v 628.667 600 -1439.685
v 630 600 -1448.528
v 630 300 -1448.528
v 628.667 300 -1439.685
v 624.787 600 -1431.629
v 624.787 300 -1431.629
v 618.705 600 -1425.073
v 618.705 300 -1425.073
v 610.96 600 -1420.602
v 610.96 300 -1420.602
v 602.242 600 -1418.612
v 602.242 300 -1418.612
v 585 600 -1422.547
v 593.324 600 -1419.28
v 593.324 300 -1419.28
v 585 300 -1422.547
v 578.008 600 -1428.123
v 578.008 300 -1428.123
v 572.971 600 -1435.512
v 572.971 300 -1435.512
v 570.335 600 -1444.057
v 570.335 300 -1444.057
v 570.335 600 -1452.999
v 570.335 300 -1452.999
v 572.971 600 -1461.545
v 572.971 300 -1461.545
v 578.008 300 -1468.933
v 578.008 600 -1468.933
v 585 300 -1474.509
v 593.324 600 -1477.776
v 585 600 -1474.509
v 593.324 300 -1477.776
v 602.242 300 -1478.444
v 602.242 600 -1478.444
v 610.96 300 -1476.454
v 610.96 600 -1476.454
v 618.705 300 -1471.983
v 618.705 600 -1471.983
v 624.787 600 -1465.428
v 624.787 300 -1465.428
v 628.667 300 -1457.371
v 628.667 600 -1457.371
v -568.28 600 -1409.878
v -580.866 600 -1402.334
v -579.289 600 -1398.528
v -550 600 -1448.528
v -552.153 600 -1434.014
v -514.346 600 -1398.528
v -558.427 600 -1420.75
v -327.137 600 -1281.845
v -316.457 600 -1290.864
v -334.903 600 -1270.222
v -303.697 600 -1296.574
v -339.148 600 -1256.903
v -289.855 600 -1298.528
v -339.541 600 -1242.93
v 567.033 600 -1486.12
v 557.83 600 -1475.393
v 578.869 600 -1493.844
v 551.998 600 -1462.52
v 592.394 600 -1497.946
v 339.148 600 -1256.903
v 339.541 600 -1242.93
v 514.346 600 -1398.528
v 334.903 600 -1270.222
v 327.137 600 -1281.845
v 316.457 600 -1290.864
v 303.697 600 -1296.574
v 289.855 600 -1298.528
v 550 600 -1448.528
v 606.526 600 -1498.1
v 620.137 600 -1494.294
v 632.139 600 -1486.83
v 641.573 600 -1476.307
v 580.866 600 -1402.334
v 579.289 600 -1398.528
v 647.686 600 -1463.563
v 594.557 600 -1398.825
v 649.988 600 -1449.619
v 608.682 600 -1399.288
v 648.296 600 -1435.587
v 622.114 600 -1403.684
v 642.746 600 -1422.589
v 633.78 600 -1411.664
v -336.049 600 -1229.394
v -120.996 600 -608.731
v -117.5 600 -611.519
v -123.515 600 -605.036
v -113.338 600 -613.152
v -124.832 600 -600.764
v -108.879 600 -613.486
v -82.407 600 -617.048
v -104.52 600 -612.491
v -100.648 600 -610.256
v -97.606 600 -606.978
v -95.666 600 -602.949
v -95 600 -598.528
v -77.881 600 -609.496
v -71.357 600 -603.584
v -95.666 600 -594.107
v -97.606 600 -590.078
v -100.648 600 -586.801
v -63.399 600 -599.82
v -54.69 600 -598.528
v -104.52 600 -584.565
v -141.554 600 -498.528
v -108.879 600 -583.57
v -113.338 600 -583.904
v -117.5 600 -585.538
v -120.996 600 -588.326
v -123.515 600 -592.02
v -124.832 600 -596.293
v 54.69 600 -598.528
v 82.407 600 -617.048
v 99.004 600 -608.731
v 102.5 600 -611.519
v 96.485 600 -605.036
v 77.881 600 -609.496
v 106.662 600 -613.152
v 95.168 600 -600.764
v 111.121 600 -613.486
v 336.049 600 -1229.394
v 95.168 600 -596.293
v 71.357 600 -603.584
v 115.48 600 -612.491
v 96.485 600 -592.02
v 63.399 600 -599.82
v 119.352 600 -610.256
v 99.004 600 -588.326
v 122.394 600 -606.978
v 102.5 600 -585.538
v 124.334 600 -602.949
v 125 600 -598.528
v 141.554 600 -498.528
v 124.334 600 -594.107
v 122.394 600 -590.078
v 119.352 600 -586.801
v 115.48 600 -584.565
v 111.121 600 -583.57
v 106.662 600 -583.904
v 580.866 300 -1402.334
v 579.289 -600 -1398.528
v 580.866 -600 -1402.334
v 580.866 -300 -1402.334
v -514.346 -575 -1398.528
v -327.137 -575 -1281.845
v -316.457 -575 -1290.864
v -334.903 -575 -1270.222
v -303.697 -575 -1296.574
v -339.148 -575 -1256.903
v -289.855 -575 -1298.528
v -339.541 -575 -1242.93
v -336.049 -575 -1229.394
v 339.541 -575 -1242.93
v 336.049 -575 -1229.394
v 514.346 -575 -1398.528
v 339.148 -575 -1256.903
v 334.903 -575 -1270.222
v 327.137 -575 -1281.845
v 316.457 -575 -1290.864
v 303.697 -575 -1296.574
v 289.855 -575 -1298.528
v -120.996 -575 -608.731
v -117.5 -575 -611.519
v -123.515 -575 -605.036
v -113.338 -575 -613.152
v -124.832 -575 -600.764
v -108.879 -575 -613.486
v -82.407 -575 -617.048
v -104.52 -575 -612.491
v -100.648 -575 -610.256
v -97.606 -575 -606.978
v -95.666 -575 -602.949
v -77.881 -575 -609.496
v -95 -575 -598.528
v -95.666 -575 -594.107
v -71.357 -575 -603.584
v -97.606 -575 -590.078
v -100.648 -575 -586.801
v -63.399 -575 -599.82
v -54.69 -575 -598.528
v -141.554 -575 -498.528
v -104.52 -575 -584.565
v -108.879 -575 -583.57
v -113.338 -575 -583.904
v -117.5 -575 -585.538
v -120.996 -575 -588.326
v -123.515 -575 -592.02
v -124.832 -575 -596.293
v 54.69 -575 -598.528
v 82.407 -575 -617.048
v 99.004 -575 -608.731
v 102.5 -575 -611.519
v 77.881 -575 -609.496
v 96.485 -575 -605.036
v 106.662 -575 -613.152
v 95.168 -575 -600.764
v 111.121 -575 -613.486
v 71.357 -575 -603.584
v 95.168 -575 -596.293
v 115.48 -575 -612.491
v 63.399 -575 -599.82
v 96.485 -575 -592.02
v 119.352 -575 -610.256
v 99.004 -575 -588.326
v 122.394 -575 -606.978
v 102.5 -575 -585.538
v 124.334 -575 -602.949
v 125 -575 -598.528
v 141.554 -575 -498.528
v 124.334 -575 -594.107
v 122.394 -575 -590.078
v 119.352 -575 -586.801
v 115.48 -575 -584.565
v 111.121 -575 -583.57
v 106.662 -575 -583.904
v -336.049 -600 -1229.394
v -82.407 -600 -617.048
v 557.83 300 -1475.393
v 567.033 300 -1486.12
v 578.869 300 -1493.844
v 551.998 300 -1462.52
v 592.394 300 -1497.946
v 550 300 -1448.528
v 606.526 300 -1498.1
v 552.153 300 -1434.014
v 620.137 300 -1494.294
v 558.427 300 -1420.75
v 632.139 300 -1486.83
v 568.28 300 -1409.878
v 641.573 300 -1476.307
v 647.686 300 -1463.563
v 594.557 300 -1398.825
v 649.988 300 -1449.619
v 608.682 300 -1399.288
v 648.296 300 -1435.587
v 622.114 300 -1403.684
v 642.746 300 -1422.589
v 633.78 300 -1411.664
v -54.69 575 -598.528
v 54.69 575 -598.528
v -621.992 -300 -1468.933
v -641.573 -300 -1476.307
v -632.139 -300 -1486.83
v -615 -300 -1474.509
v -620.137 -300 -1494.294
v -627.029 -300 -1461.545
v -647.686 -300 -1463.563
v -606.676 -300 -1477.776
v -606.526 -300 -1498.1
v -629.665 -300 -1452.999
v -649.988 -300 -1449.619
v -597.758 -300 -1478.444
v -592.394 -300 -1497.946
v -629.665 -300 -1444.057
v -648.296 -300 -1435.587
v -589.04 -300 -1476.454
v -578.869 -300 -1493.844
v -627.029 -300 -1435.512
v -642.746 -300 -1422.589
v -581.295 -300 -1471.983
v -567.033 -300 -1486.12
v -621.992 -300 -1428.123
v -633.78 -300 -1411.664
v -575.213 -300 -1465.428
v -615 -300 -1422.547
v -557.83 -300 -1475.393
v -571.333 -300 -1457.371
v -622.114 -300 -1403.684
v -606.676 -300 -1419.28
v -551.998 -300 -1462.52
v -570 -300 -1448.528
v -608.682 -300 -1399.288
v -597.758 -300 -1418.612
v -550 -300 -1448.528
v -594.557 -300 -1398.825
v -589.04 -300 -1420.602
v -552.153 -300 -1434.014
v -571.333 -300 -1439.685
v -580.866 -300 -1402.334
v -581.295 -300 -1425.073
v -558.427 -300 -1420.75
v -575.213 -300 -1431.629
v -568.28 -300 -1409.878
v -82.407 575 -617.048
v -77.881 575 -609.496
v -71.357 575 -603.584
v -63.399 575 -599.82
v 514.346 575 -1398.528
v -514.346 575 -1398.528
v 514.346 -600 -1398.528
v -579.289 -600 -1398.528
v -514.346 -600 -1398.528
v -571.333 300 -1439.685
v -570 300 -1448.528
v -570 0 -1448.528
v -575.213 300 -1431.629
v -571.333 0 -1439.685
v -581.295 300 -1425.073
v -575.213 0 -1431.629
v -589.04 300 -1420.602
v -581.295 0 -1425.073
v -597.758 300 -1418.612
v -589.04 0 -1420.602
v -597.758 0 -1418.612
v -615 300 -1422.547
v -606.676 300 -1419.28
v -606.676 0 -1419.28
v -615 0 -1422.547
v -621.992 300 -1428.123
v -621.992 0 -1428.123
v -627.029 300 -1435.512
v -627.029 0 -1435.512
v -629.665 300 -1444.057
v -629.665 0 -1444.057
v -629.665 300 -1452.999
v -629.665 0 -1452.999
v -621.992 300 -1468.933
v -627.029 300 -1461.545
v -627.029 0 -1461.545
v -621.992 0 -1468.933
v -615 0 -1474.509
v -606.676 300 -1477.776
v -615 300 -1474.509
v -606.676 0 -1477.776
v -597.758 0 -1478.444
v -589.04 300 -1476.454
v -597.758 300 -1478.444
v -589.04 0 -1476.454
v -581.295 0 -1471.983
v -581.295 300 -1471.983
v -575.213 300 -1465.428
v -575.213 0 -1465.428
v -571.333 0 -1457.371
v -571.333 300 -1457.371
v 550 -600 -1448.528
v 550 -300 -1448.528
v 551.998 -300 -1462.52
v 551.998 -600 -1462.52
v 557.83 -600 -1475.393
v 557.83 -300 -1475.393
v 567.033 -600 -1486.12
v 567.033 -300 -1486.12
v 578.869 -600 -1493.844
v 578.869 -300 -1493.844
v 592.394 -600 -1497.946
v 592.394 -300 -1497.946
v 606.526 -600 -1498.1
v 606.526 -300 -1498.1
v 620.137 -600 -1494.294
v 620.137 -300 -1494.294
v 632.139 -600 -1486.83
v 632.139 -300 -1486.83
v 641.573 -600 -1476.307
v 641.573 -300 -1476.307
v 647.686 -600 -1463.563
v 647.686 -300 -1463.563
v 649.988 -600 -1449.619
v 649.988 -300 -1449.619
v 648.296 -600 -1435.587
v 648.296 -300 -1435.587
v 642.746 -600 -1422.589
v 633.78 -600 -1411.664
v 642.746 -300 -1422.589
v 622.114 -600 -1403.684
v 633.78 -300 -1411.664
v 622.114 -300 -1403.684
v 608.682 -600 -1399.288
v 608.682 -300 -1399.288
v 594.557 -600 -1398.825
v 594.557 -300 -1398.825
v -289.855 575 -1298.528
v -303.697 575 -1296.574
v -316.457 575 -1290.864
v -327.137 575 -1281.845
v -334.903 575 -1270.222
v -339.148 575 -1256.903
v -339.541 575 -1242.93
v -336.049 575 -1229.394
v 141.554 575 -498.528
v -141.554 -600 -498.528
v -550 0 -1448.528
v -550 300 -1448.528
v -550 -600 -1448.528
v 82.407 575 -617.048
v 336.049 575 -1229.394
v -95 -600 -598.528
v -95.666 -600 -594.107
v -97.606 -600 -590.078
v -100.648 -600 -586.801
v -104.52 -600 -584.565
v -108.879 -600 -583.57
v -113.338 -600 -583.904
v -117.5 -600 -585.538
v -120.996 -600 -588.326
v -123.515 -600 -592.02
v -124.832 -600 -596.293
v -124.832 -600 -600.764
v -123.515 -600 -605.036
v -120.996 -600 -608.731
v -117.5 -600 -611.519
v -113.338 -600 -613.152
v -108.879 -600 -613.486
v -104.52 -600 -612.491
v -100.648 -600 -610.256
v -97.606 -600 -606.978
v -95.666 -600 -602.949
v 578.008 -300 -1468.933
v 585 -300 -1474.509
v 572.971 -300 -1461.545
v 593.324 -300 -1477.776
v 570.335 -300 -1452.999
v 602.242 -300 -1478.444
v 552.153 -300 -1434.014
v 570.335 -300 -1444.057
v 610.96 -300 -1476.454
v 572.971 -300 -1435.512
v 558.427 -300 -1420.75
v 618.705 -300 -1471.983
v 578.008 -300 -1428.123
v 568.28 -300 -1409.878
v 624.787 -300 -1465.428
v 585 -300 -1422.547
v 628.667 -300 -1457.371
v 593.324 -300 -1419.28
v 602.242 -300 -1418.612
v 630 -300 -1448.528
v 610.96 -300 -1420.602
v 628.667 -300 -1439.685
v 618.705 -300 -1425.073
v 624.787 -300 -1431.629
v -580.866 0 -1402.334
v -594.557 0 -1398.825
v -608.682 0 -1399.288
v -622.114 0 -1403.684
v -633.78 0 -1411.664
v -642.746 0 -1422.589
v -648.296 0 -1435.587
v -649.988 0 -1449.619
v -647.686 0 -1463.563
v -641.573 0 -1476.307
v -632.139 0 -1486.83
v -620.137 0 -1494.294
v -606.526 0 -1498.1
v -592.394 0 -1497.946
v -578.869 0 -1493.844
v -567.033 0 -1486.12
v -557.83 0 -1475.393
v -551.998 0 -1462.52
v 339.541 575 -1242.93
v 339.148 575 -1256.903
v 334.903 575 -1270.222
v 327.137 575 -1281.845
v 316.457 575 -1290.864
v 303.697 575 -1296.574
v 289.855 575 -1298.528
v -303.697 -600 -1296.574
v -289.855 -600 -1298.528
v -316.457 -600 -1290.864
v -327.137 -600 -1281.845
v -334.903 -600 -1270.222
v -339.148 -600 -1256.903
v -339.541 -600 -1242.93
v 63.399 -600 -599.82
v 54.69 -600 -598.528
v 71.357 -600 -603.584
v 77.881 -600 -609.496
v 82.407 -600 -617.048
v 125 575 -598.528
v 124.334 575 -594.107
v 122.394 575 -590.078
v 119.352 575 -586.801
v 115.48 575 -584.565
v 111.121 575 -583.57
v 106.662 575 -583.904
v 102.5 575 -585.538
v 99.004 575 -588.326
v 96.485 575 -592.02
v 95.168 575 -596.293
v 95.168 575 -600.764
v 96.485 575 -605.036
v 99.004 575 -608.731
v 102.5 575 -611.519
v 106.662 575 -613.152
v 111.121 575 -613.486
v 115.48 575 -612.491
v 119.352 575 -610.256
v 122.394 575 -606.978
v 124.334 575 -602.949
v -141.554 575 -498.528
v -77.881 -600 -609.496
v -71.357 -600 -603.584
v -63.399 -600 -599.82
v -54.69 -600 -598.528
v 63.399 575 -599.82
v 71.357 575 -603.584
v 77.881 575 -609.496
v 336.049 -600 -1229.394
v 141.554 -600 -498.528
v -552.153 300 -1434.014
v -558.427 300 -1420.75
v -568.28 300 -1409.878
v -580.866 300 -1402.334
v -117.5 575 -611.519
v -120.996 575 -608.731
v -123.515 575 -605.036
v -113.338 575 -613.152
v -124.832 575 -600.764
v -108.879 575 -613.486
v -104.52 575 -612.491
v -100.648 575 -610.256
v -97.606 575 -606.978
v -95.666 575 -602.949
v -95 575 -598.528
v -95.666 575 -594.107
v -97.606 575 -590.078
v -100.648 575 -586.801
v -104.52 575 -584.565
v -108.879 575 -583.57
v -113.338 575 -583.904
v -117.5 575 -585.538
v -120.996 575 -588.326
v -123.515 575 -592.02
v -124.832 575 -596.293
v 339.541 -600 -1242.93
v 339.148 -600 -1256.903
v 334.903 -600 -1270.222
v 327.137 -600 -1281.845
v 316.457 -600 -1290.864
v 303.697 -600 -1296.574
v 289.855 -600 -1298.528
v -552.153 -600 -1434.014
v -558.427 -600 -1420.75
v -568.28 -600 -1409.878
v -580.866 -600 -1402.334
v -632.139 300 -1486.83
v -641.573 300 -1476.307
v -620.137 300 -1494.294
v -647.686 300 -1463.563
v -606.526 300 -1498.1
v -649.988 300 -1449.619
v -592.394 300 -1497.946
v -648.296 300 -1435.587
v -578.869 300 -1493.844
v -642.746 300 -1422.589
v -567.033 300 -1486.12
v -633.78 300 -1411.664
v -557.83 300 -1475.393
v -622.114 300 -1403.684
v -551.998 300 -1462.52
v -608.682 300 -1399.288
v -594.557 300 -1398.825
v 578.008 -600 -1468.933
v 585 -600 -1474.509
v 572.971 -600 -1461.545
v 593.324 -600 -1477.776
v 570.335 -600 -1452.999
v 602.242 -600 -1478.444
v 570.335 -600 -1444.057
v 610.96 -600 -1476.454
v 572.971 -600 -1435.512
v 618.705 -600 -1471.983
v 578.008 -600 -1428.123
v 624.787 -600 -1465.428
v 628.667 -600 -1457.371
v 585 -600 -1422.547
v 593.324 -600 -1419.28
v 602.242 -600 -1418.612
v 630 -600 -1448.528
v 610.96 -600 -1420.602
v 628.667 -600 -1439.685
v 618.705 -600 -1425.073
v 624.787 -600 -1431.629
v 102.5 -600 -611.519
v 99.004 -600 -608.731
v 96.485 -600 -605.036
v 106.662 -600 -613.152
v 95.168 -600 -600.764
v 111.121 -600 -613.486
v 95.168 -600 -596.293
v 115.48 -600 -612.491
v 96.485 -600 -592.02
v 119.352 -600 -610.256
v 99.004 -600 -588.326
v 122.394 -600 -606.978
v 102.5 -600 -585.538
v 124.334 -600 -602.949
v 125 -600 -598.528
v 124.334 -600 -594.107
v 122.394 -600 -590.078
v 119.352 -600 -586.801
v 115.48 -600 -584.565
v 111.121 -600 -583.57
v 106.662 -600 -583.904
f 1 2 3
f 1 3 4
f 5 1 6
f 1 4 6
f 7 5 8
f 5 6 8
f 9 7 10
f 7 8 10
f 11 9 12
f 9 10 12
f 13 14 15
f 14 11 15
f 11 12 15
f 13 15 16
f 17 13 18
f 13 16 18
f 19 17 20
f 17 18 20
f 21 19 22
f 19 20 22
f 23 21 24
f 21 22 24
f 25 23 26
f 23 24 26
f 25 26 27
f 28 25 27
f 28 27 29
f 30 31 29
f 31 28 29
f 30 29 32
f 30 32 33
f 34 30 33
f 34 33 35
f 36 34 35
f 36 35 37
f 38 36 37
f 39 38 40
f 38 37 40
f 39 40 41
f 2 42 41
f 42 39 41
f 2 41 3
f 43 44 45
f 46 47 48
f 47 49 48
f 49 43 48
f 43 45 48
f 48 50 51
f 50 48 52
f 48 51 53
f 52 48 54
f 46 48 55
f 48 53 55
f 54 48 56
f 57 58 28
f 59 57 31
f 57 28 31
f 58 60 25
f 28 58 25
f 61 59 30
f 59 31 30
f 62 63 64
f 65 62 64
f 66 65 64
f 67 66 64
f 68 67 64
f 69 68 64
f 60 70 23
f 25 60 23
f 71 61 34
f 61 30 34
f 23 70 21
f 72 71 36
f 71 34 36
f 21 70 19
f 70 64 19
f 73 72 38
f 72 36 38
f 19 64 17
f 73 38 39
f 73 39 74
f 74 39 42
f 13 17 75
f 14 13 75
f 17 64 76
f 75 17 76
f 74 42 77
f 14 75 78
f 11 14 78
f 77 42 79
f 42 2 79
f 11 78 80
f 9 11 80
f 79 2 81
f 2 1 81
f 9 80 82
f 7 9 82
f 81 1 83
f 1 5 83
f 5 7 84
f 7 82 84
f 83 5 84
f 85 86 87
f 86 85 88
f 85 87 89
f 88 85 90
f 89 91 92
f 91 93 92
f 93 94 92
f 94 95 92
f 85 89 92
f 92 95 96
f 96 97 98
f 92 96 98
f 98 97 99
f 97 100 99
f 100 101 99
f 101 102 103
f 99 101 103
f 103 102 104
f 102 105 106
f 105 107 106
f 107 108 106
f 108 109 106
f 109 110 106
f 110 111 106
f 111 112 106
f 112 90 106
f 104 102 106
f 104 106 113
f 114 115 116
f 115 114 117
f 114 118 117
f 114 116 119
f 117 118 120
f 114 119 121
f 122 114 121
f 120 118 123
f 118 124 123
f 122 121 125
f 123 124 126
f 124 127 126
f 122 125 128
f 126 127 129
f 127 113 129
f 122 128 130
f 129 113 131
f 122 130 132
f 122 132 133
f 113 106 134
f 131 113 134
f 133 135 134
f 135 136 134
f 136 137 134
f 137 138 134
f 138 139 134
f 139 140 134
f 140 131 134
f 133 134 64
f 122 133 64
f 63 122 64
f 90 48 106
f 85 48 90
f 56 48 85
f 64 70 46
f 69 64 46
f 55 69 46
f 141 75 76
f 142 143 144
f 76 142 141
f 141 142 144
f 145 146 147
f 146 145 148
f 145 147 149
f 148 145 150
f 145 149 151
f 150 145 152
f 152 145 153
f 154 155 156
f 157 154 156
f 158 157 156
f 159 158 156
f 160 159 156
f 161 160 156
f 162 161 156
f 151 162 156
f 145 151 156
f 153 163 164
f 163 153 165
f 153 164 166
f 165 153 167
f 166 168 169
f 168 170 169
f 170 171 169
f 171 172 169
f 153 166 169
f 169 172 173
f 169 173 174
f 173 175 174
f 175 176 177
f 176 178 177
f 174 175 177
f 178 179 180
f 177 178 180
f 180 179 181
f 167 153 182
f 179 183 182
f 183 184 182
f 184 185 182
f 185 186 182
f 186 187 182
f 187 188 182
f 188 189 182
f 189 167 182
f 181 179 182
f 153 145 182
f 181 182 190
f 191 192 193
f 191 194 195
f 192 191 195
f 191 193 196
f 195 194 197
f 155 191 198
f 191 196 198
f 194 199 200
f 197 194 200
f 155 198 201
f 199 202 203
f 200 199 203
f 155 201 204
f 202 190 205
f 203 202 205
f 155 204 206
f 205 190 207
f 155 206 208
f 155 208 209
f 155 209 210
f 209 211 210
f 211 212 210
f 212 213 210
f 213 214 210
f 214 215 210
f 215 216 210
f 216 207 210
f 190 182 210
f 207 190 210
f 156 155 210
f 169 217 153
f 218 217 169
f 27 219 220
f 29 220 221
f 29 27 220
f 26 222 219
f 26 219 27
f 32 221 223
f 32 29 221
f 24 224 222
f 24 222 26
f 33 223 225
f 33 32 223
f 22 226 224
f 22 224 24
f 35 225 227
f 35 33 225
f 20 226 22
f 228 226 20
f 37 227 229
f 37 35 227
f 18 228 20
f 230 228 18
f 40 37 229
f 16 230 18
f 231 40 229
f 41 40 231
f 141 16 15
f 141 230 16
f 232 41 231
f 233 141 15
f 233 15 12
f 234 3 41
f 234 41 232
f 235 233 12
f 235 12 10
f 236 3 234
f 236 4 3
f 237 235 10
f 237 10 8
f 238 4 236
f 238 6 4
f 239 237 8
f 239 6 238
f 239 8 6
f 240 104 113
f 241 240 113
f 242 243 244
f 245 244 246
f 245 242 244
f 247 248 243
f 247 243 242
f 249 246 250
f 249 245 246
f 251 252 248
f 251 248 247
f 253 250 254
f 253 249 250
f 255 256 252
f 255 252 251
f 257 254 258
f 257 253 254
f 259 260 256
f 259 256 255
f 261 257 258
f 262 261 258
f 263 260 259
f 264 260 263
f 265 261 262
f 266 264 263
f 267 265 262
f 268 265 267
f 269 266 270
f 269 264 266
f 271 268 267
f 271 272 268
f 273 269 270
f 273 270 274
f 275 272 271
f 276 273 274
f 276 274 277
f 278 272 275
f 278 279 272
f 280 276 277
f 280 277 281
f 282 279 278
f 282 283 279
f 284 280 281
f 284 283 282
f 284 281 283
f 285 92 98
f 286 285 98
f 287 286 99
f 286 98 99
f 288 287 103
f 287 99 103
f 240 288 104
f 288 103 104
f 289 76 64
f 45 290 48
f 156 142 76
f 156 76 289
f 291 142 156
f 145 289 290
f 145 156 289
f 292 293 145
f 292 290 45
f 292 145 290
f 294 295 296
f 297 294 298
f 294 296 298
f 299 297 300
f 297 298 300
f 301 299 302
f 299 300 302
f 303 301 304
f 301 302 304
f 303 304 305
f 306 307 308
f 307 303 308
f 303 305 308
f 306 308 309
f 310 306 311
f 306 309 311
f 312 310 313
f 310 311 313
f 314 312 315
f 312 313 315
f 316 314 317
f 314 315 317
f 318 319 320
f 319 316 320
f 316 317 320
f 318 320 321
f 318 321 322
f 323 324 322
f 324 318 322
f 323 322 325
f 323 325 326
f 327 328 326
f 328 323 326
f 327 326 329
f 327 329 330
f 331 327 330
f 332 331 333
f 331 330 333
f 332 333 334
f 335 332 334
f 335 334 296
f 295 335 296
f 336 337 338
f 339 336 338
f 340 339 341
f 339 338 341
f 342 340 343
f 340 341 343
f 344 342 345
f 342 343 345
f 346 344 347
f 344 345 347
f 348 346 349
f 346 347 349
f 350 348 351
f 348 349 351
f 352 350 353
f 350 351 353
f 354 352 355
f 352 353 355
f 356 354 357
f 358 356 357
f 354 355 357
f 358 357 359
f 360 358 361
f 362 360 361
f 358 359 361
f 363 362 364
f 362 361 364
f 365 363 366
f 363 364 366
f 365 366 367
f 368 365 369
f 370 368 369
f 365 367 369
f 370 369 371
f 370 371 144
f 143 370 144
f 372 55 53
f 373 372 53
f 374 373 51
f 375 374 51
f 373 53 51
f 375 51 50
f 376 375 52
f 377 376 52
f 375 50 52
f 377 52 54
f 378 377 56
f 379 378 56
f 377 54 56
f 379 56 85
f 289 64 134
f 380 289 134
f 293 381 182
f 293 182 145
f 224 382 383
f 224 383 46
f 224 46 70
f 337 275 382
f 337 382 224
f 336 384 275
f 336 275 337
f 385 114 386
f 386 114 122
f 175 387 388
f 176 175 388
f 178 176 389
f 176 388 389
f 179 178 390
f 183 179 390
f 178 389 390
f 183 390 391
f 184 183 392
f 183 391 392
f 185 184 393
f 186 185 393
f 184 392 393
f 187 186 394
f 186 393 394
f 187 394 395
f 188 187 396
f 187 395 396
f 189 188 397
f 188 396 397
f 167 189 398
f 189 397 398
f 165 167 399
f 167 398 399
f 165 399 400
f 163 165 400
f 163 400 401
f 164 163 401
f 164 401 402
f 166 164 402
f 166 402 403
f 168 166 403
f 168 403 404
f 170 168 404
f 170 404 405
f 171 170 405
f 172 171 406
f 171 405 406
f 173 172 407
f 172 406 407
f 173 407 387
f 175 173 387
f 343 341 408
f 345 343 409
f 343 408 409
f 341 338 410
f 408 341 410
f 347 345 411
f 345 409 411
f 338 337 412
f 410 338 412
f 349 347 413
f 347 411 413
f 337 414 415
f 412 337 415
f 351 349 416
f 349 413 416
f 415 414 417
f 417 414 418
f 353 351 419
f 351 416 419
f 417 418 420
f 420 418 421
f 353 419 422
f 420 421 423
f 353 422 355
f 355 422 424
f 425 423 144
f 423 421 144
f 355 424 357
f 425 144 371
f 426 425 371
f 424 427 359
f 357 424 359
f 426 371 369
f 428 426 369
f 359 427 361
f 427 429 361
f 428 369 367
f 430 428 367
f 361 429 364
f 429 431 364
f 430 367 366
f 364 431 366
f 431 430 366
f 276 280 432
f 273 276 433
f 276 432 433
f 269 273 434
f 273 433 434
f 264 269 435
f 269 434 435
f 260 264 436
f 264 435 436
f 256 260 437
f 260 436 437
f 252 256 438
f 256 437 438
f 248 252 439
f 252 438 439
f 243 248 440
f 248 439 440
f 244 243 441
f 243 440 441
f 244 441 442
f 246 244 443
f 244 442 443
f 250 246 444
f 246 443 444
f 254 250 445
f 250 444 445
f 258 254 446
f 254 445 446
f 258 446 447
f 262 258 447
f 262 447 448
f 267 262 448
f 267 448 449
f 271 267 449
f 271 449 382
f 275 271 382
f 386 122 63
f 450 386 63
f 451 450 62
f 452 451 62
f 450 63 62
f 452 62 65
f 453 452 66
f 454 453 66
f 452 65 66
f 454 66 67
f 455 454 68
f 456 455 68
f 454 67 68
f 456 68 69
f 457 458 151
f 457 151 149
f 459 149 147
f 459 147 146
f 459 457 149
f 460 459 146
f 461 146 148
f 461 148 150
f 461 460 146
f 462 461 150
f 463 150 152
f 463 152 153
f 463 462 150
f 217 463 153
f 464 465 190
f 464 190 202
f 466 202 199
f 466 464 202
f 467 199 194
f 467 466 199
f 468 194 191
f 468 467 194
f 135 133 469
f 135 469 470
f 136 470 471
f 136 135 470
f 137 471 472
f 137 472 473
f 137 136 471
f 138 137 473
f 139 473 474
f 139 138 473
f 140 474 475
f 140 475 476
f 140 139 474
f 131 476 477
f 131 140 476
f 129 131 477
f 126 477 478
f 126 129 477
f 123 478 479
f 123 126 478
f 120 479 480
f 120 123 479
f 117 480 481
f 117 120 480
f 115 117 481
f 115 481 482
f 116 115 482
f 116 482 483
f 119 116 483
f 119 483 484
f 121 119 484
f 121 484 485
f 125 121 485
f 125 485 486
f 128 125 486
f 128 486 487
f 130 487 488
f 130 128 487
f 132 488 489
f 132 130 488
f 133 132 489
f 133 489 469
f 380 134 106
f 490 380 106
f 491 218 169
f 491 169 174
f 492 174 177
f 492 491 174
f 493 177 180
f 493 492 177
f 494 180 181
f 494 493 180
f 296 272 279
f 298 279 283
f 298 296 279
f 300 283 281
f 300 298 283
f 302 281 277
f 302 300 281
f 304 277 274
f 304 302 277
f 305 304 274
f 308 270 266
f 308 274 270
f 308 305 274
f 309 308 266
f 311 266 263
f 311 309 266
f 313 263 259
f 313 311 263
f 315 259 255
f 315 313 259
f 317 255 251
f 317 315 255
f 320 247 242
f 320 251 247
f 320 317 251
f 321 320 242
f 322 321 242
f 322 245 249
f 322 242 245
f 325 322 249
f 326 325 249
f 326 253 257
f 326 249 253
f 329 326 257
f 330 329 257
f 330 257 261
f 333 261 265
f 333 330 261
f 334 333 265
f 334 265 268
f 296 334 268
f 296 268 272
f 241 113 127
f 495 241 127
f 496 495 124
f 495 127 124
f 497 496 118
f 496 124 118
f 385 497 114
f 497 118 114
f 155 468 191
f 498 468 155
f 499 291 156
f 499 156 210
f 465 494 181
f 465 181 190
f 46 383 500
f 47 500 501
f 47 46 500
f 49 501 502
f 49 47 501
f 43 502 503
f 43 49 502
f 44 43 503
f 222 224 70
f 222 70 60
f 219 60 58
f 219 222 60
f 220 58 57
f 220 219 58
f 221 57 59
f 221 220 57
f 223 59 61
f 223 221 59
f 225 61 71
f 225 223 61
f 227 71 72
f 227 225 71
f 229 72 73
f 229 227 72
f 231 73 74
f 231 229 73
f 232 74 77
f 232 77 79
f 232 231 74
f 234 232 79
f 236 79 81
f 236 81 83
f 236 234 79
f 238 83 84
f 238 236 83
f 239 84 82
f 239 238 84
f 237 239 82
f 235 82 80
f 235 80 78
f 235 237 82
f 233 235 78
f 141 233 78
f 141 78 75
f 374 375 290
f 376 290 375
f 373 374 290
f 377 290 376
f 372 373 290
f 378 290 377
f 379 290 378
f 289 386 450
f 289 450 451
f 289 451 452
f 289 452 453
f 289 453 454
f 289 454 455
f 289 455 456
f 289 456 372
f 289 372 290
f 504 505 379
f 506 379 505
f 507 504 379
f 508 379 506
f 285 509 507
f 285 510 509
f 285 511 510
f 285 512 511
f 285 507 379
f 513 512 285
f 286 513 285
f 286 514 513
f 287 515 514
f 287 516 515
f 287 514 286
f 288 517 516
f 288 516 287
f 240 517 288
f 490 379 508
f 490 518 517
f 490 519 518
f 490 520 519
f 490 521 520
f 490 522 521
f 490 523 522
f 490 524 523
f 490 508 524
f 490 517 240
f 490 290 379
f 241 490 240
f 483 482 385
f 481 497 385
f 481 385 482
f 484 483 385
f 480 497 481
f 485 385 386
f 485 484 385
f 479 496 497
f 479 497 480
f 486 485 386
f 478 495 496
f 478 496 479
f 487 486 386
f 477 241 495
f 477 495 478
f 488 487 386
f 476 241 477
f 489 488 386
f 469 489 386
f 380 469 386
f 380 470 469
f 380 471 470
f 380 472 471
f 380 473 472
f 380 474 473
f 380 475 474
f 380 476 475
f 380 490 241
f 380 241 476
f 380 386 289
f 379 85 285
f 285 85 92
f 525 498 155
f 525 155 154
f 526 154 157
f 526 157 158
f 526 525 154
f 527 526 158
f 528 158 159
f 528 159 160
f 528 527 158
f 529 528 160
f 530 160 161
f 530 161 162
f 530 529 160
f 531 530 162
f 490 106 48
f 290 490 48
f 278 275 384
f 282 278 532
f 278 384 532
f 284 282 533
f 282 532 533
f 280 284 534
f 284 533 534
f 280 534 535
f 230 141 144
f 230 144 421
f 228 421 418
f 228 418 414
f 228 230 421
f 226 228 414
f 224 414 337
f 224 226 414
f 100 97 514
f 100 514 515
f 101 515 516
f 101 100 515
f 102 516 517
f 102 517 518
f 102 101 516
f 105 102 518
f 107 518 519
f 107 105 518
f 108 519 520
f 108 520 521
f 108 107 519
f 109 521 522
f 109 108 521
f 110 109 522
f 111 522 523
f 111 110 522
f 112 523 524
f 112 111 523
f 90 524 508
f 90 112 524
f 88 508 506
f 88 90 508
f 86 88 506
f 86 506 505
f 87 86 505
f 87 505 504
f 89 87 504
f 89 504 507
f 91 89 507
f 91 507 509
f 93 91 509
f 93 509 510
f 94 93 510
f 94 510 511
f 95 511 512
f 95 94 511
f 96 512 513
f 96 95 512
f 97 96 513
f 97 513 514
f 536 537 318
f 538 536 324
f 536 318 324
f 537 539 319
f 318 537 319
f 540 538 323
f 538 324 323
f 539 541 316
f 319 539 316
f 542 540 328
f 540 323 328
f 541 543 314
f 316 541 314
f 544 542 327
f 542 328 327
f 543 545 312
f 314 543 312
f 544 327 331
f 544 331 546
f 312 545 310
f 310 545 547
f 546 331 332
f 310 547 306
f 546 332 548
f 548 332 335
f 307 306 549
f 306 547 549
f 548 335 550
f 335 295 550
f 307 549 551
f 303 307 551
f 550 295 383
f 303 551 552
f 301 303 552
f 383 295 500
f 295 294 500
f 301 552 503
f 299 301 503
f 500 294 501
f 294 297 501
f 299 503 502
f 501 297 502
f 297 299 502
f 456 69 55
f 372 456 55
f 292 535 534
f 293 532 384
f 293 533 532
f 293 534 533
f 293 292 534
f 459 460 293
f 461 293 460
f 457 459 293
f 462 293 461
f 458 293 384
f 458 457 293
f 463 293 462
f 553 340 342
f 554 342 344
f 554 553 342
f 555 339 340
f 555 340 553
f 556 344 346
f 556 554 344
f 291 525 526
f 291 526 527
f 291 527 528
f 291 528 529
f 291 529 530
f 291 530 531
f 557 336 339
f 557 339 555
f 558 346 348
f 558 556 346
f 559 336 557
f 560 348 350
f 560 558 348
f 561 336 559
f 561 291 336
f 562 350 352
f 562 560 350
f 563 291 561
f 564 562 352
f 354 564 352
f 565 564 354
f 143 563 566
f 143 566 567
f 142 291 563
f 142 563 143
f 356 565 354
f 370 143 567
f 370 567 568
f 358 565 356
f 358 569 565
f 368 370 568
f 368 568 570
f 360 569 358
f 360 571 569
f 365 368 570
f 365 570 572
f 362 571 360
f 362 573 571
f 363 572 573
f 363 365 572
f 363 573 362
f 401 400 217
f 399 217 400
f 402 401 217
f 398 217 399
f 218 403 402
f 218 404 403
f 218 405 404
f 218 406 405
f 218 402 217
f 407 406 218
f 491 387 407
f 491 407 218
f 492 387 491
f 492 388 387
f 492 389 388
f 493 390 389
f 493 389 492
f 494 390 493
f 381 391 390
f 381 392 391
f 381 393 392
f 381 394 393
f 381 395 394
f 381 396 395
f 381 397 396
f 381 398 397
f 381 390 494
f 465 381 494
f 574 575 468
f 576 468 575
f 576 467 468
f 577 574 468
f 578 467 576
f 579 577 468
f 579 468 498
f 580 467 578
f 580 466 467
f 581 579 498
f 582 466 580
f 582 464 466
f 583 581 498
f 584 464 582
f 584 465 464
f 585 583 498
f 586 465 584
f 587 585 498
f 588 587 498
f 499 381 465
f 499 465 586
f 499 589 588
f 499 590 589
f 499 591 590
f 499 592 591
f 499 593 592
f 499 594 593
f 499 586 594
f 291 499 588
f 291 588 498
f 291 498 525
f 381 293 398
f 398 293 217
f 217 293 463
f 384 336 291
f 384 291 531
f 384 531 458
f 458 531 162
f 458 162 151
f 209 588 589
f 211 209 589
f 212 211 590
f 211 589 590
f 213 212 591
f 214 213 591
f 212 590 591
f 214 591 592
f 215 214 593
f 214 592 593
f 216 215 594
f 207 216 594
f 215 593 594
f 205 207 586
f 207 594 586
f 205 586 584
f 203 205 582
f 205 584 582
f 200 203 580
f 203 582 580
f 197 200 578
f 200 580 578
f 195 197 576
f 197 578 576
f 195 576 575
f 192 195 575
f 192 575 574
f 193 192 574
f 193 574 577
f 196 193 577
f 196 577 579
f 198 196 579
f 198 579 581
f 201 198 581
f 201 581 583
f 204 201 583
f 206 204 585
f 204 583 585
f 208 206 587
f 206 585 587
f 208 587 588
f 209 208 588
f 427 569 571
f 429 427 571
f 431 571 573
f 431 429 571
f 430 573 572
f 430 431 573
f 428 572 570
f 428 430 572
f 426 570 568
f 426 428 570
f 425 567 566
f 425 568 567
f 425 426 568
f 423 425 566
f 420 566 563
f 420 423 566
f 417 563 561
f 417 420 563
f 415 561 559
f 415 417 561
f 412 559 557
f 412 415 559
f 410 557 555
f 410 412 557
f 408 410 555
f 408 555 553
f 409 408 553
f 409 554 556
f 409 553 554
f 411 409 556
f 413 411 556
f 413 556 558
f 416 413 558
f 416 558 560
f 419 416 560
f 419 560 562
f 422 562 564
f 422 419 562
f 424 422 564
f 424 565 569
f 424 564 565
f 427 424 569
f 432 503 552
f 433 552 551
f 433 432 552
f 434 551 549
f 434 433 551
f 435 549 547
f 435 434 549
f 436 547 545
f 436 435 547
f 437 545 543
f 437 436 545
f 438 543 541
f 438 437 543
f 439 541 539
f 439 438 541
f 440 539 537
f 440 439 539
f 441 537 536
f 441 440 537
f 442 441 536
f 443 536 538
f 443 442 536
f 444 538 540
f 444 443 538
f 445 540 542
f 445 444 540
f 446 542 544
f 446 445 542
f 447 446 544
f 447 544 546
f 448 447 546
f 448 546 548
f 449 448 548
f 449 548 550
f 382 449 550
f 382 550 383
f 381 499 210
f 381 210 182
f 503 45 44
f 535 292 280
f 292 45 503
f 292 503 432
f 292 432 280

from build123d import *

# Parameters (mm, degrees)
F2_DEPTH  = 600
F3_R      = 50
F4_DEPTH  = 600
F5_R      = 50
F6_DEPTH  = 300
F7_R      = 50
F8_DEPTH  = 300
F9_R      = 30
F10_DEPTH = 600.001
F11_R     = 15
F12_DEPTH = 25


with BuildPart() as f2:
    # F1 (on Front) → F2 (new body)
    with BuildSketch(Plane.XZ):
        Polygon((-579.289322, -1398.528137), (-600, -1448.528137), (600, -1448.528137), (579.289322, -1398.528137), align=None)
    extrude(amount=F2_DEPTH)

    # F3 (on face) → F4 (join, through all)
    with BuildSketch(Plane.XZ):
        with Locations((-600, -1448.528137)):
            Circle(F3_R)
        with Locations((600, -1448.528137)):
            Circle(F3_R)
    extrude(amount=F4_DEPTH)

    # F5 (on Front) → F6 (cut, symmetric)
    with BuildSketch(Plane.XZ):
        with Locations((600, -1448.528137)):
            Circle(F5_R)
    extrude(amount=F6_DEPTH, both=True, mode=Mode.SUBTRACT)

    # F7 (on face) → F8 (cut, through all)
    with BuildSketch(Plane.XZ.offset(600)):
        with Locations((-600, -1448.528137)):
            Circle(F7_R)
    extrude(amount=-F8_DEPTH, mode=Mode.SUBTRACT)

    # F9 (on Front) → F10 (cut, through all)
    with BuildSketch(Plane.XZ):
        with Locations((-600, -1448.528137)):
            Circle(F9_R)
        with Locations((600, -1448.528137)):
            Circle(F9_R)
    extrude(amount=F10_DEPTH, mode=Mode.SUBTRACT)

    # F11 (on face) → F12 (join)
    with BuildSketch(Plane.XZ.offset(600)):
        Polygon((141.553584, -498.528137), (-141.553584, -498.528137), (-514.34579, -1398.528137), (514.34579, -1398.528137), align=None)
        with BuildLine():
            Line((-336.048902, -1229.393966), (-82.406747, -617.047634))
            ThreePointArc((-82.406747, -617.047634), (-71.357468, -603.584049), (-54.690361, -598.528137))
            Line((-54.690361, -598.528137), (54.690361, -598.528137))
            ThreePointArc((54.690361, -598.528137), (71.357468, -603.584049), (82.406747, -617.047634))
            Line((82.406747, -617.047634), (336.048902, -1229.393966))
            ThreePointArc((336.048902, -1229.393966), (331.428406, -1276.306649), (289.854925, -1298.528137))
            Line((289.854925, -1298.528137), (-289.854925, -1298.528137))
            ThreePointArc((-289.854925, -1298.528137), (-331.428406, -1276.306649), (-336.048902, -1229.393966))
        make_face(mode=Mode.SUBTRACT)
        with Locations((-110, -598.528137)):
            Circle(F11_R, mode=Mode.SUBTRACT)
        with Locations((110, -598.528137)):
            Circle(F11_R, mode=Mode.SUBTRACT)
    extrude(amount=-F12_DEPTH)

    # F13: F2 across plane


with BuildPart() as f2_1:
    add(f2.part)
    add(f2.part.mirror(Plane.XZ))


solid = f2_1.part
